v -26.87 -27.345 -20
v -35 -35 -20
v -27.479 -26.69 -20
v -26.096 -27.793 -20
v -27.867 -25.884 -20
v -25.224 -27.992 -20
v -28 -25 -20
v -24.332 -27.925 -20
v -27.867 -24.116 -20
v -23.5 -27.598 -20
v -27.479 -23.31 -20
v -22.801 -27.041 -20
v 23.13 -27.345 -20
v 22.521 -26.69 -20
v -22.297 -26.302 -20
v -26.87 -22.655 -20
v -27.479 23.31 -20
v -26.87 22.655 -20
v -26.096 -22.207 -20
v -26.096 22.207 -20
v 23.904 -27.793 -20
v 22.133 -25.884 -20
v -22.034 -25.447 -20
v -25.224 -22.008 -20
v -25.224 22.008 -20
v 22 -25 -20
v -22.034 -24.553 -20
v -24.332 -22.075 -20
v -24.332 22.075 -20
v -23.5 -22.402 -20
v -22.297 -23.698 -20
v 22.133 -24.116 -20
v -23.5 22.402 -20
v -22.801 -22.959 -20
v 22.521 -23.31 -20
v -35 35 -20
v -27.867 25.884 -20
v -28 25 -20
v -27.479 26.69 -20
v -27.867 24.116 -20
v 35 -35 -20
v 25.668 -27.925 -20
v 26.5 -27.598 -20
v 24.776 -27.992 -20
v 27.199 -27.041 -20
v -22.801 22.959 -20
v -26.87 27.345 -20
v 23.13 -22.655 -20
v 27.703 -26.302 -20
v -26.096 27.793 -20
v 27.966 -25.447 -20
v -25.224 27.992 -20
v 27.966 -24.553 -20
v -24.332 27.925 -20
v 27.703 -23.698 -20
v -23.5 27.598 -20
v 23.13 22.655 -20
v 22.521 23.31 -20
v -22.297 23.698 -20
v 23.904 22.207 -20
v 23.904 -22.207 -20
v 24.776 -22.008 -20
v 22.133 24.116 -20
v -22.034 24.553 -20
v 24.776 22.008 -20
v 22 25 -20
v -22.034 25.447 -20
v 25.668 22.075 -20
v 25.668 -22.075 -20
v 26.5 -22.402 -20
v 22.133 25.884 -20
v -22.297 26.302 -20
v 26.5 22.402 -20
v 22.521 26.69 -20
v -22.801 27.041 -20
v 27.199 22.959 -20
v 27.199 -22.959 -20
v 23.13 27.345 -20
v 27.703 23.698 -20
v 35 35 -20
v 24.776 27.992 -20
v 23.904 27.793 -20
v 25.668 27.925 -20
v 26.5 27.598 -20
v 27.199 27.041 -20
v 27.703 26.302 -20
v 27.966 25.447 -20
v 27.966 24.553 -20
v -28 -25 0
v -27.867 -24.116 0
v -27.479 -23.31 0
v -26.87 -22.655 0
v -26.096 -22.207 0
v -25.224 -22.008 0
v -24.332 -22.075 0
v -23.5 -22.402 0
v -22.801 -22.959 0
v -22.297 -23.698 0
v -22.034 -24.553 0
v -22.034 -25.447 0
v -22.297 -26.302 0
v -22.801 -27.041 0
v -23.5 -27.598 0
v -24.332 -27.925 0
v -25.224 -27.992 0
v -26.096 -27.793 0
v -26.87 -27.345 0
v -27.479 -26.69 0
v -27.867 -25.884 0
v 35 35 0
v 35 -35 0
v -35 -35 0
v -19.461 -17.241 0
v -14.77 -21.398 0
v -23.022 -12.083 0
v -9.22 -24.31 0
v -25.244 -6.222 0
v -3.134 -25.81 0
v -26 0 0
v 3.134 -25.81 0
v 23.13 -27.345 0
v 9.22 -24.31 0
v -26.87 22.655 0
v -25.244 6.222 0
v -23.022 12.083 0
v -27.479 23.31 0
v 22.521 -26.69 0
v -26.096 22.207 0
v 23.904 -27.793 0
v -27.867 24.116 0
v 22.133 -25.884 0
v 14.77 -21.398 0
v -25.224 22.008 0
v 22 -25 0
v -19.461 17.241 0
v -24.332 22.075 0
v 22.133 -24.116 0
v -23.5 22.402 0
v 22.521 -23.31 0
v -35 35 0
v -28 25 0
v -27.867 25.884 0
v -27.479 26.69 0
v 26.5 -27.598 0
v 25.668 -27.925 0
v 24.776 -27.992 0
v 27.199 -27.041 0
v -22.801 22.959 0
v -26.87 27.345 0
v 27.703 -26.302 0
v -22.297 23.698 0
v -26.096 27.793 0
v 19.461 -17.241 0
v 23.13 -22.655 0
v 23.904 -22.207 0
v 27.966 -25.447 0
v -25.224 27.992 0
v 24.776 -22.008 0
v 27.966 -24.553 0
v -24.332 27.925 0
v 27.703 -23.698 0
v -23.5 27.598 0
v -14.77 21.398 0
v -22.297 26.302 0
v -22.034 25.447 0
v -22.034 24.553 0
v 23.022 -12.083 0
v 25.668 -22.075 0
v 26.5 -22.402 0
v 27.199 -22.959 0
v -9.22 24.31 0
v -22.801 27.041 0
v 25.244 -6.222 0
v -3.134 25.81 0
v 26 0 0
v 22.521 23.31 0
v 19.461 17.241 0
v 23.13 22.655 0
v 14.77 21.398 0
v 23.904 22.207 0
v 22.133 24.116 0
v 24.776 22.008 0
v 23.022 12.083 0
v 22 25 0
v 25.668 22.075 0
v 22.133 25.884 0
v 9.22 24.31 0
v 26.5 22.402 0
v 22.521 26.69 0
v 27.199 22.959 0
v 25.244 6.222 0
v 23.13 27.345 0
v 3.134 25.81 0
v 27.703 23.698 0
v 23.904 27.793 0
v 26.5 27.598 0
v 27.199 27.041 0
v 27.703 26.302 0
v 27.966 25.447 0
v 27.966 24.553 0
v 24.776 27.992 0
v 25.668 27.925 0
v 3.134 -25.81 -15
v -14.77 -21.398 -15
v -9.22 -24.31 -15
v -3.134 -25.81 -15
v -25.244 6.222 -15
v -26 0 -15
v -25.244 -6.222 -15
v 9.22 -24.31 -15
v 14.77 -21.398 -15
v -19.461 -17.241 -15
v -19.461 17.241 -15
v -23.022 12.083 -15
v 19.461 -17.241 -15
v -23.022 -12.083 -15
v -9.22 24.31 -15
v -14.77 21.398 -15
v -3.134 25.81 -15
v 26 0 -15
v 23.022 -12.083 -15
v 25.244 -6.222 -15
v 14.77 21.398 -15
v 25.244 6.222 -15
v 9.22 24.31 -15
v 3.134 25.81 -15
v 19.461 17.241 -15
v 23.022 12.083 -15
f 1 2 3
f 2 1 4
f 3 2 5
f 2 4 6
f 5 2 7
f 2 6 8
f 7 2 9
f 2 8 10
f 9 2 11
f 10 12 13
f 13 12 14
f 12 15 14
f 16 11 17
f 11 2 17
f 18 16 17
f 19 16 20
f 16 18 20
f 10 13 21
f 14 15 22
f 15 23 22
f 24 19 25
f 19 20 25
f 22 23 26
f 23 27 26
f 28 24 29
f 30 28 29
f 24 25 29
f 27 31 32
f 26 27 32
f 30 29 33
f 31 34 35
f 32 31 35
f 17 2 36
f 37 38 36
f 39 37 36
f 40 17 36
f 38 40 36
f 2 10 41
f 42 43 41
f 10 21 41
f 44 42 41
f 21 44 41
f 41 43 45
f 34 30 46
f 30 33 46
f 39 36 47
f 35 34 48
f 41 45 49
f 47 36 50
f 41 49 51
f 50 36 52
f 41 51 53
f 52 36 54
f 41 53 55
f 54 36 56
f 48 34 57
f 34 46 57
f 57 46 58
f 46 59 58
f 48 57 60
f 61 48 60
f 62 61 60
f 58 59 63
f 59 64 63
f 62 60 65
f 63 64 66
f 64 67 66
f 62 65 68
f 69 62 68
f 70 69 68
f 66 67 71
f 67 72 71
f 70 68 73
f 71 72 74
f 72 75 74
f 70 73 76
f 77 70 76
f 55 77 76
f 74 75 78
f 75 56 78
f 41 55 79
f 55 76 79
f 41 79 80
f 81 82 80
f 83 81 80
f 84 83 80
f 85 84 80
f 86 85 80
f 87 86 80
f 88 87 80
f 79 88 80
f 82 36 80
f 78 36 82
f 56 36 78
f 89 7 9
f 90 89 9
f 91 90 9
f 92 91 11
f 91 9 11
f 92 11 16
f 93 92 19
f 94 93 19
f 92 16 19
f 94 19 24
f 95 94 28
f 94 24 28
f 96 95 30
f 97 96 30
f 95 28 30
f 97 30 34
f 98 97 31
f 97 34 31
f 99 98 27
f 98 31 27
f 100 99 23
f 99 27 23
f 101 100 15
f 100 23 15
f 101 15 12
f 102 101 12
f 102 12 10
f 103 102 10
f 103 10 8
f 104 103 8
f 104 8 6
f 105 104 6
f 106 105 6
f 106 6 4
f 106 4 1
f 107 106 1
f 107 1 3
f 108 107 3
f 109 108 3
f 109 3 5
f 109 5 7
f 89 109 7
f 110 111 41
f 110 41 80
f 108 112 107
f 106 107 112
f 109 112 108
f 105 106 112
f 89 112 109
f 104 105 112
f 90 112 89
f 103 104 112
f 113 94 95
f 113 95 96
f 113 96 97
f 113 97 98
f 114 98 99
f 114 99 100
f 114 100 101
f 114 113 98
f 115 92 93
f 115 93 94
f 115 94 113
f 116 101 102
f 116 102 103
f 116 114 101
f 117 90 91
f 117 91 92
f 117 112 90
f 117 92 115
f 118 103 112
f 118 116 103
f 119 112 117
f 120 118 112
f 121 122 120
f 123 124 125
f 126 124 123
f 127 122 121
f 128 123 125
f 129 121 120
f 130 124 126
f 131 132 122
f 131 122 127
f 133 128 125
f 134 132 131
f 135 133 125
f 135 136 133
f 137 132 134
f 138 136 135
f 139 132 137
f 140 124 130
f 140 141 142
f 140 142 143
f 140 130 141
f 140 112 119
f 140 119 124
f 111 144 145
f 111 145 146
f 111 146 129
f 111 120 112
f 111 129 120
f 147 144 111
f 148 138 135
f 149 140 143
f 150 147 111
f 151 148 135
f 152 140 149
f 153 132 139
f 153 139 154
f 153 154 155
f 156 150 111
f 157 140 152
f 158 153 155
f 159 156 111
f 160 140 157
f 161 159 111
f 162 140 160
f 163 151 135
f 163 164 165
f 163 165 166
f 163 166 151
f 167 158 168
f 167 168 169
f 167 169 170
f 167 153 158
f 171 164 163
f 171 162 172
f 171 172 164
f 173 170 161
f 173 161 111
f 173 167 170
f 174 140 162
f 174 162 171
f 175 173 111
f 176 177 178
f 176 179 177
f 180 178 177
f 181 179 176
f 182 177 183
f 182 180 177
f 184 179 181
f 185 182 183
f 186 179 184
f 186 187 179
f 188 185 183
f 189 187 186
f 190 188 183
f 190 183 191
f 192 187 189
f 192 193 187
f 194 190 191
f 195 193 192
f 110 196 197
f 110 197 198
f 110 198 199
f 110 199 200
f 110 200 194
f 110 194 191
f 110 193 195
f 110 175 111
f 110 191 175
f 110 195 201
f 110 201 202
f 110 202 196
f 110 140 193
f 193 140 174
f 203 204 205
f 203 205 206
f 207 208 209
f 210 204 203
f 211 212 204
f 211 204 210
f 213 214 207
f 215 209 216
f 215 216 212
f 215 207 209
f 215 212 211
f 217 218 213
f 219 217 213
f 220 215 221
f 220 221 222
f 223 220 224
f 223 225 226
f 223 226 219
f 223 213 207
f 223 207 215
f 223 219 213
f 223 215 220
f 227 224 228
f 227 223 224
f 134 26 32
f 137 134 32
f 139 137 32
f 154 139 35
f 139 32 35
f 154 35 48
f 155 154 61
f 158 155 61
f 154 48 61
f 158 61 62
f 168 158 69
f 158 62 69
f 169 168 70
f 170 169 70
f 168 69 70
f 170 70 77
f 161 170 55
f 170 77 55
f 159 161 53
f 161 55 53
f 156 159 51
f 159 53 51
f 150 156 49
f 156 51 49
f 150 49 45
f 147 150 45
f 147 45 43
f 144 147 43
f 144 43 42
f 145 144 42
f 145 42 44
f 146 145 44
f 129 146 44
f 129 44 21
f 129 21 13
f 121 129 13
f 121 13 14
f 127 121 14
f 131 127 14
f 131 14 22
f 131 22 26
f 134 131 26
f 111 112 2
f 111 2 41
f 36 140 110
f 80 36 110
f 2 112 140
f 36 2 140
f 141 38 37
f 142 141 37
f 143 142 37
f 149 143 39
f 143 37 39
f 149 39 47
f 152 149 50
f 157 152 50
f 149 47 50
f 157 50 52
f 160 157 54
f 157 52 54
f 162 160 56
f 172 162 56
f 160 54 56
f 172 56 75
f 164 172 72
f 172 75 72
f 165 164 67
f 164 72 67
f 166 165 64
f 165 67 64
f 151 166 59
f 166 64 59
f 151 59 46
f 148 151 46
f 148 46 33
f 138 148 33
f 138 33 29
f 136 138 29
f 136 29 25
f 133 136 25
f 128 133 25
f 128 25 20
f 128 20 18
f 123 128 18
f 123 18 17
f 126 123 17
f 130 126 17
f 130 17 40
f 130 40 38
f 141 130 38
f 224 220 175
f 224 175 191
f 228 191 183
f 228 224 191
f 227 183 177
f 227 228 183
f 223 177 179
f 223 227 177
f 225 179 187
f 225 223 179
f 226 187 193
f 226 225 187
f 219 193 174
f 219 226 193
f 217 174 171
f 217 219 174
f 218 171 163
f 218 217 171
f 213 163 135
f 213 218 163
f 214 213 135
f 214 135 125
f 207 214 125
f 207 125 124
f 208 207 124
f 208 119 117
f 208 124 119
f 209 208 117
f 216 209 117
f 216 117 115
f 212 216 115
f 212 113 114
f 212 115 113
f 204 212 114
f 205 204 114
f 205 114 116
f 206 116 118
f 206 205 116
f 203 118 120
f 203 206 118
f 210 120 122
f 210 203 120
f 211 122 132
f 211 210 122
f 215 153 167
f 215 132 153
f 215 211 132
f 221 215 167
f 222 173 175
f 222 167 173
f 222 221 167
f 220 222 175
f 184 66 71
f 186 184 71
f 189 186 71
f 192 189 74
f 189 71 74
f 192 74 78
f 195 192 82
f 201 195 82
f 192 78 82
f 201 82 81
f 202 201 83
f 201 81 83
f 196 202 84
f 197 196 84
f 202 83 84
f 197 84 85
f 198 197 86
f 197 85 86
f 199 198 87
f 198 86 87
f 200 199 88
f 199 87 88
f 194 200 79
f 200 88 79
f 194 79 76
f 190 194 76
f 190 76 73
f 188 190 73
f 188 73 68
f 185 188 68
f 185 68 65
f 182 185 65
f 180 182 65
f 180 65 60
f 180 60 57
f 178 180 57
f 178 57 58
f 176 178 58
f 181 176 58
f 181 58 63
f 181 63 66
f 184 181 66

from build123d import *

# Parameters (mm, degrees)
ESQUISSE1_W                  = 70
ESQUISSE1_H                  = 70
BOSS_EXTRU_1_DEPTH           = 20
ENL_V_MAT_EXTRU_1_DEPTH      = 54.38539126
ENL_V_MAT_EXTRU_1_DEPTH_BACK = 15
ESQUISSE2_R                  = 26
ESQUISSE3_R                  = 3
ENL_V_MAT_EXTRU_2_DEPTH      = 54.38539126


with BuildPart() as part:
    # Esquisse1 → Boss.-Extru.1 (new body)
    with BuildSketch(Plane.XY):
        Rectangle(ESQUISSE1_W, ESQUISSE1_H)
    extrude(amount=-BOSS_EXTRU_1_DEPTH)

    # Esquisse2 → Enlèv. mat.-Extru.1 (cut, two sides: drawn at the far end of the back side and taken through both)
    with BuildSketch(Plane.XY.offset(-ENL_V_MAT_EXTRU_1_DEPTH_BACK)):
        Circle(ESQUISSE2_R)
    extrude(amount=ENL_V_MAT_EXTRU_1_DEPTH + ENL_V_MAT_EXTRU_1_DEPTH_BACK, mode=Mode.SUBTRACT)

    # Esquisse3 → Enlèv. mat.-Extru.2 (cut, through all)
    with BuildSketch(Plane(origin=(0, 0, -20), x_dir=(-1, 0, 0), z_dir=(0, 0, -1))):
        with Locations((-25, 25)):
            Circle(ESQUISSE3_R)
        with Locations((25, 25)):
            Circle(ESQUISSE3_R)
        with Locations((25, -25)):
            Circle(ESQUISSE3_R)
        with Locations((-25, -25)):
            Circle(ESQUISSE3_R)
    extrude(amount=-ENL_V_MAT_EXTRU_2_DEPTH, mode=Mode.SUBTRACT)


solid = part.part
